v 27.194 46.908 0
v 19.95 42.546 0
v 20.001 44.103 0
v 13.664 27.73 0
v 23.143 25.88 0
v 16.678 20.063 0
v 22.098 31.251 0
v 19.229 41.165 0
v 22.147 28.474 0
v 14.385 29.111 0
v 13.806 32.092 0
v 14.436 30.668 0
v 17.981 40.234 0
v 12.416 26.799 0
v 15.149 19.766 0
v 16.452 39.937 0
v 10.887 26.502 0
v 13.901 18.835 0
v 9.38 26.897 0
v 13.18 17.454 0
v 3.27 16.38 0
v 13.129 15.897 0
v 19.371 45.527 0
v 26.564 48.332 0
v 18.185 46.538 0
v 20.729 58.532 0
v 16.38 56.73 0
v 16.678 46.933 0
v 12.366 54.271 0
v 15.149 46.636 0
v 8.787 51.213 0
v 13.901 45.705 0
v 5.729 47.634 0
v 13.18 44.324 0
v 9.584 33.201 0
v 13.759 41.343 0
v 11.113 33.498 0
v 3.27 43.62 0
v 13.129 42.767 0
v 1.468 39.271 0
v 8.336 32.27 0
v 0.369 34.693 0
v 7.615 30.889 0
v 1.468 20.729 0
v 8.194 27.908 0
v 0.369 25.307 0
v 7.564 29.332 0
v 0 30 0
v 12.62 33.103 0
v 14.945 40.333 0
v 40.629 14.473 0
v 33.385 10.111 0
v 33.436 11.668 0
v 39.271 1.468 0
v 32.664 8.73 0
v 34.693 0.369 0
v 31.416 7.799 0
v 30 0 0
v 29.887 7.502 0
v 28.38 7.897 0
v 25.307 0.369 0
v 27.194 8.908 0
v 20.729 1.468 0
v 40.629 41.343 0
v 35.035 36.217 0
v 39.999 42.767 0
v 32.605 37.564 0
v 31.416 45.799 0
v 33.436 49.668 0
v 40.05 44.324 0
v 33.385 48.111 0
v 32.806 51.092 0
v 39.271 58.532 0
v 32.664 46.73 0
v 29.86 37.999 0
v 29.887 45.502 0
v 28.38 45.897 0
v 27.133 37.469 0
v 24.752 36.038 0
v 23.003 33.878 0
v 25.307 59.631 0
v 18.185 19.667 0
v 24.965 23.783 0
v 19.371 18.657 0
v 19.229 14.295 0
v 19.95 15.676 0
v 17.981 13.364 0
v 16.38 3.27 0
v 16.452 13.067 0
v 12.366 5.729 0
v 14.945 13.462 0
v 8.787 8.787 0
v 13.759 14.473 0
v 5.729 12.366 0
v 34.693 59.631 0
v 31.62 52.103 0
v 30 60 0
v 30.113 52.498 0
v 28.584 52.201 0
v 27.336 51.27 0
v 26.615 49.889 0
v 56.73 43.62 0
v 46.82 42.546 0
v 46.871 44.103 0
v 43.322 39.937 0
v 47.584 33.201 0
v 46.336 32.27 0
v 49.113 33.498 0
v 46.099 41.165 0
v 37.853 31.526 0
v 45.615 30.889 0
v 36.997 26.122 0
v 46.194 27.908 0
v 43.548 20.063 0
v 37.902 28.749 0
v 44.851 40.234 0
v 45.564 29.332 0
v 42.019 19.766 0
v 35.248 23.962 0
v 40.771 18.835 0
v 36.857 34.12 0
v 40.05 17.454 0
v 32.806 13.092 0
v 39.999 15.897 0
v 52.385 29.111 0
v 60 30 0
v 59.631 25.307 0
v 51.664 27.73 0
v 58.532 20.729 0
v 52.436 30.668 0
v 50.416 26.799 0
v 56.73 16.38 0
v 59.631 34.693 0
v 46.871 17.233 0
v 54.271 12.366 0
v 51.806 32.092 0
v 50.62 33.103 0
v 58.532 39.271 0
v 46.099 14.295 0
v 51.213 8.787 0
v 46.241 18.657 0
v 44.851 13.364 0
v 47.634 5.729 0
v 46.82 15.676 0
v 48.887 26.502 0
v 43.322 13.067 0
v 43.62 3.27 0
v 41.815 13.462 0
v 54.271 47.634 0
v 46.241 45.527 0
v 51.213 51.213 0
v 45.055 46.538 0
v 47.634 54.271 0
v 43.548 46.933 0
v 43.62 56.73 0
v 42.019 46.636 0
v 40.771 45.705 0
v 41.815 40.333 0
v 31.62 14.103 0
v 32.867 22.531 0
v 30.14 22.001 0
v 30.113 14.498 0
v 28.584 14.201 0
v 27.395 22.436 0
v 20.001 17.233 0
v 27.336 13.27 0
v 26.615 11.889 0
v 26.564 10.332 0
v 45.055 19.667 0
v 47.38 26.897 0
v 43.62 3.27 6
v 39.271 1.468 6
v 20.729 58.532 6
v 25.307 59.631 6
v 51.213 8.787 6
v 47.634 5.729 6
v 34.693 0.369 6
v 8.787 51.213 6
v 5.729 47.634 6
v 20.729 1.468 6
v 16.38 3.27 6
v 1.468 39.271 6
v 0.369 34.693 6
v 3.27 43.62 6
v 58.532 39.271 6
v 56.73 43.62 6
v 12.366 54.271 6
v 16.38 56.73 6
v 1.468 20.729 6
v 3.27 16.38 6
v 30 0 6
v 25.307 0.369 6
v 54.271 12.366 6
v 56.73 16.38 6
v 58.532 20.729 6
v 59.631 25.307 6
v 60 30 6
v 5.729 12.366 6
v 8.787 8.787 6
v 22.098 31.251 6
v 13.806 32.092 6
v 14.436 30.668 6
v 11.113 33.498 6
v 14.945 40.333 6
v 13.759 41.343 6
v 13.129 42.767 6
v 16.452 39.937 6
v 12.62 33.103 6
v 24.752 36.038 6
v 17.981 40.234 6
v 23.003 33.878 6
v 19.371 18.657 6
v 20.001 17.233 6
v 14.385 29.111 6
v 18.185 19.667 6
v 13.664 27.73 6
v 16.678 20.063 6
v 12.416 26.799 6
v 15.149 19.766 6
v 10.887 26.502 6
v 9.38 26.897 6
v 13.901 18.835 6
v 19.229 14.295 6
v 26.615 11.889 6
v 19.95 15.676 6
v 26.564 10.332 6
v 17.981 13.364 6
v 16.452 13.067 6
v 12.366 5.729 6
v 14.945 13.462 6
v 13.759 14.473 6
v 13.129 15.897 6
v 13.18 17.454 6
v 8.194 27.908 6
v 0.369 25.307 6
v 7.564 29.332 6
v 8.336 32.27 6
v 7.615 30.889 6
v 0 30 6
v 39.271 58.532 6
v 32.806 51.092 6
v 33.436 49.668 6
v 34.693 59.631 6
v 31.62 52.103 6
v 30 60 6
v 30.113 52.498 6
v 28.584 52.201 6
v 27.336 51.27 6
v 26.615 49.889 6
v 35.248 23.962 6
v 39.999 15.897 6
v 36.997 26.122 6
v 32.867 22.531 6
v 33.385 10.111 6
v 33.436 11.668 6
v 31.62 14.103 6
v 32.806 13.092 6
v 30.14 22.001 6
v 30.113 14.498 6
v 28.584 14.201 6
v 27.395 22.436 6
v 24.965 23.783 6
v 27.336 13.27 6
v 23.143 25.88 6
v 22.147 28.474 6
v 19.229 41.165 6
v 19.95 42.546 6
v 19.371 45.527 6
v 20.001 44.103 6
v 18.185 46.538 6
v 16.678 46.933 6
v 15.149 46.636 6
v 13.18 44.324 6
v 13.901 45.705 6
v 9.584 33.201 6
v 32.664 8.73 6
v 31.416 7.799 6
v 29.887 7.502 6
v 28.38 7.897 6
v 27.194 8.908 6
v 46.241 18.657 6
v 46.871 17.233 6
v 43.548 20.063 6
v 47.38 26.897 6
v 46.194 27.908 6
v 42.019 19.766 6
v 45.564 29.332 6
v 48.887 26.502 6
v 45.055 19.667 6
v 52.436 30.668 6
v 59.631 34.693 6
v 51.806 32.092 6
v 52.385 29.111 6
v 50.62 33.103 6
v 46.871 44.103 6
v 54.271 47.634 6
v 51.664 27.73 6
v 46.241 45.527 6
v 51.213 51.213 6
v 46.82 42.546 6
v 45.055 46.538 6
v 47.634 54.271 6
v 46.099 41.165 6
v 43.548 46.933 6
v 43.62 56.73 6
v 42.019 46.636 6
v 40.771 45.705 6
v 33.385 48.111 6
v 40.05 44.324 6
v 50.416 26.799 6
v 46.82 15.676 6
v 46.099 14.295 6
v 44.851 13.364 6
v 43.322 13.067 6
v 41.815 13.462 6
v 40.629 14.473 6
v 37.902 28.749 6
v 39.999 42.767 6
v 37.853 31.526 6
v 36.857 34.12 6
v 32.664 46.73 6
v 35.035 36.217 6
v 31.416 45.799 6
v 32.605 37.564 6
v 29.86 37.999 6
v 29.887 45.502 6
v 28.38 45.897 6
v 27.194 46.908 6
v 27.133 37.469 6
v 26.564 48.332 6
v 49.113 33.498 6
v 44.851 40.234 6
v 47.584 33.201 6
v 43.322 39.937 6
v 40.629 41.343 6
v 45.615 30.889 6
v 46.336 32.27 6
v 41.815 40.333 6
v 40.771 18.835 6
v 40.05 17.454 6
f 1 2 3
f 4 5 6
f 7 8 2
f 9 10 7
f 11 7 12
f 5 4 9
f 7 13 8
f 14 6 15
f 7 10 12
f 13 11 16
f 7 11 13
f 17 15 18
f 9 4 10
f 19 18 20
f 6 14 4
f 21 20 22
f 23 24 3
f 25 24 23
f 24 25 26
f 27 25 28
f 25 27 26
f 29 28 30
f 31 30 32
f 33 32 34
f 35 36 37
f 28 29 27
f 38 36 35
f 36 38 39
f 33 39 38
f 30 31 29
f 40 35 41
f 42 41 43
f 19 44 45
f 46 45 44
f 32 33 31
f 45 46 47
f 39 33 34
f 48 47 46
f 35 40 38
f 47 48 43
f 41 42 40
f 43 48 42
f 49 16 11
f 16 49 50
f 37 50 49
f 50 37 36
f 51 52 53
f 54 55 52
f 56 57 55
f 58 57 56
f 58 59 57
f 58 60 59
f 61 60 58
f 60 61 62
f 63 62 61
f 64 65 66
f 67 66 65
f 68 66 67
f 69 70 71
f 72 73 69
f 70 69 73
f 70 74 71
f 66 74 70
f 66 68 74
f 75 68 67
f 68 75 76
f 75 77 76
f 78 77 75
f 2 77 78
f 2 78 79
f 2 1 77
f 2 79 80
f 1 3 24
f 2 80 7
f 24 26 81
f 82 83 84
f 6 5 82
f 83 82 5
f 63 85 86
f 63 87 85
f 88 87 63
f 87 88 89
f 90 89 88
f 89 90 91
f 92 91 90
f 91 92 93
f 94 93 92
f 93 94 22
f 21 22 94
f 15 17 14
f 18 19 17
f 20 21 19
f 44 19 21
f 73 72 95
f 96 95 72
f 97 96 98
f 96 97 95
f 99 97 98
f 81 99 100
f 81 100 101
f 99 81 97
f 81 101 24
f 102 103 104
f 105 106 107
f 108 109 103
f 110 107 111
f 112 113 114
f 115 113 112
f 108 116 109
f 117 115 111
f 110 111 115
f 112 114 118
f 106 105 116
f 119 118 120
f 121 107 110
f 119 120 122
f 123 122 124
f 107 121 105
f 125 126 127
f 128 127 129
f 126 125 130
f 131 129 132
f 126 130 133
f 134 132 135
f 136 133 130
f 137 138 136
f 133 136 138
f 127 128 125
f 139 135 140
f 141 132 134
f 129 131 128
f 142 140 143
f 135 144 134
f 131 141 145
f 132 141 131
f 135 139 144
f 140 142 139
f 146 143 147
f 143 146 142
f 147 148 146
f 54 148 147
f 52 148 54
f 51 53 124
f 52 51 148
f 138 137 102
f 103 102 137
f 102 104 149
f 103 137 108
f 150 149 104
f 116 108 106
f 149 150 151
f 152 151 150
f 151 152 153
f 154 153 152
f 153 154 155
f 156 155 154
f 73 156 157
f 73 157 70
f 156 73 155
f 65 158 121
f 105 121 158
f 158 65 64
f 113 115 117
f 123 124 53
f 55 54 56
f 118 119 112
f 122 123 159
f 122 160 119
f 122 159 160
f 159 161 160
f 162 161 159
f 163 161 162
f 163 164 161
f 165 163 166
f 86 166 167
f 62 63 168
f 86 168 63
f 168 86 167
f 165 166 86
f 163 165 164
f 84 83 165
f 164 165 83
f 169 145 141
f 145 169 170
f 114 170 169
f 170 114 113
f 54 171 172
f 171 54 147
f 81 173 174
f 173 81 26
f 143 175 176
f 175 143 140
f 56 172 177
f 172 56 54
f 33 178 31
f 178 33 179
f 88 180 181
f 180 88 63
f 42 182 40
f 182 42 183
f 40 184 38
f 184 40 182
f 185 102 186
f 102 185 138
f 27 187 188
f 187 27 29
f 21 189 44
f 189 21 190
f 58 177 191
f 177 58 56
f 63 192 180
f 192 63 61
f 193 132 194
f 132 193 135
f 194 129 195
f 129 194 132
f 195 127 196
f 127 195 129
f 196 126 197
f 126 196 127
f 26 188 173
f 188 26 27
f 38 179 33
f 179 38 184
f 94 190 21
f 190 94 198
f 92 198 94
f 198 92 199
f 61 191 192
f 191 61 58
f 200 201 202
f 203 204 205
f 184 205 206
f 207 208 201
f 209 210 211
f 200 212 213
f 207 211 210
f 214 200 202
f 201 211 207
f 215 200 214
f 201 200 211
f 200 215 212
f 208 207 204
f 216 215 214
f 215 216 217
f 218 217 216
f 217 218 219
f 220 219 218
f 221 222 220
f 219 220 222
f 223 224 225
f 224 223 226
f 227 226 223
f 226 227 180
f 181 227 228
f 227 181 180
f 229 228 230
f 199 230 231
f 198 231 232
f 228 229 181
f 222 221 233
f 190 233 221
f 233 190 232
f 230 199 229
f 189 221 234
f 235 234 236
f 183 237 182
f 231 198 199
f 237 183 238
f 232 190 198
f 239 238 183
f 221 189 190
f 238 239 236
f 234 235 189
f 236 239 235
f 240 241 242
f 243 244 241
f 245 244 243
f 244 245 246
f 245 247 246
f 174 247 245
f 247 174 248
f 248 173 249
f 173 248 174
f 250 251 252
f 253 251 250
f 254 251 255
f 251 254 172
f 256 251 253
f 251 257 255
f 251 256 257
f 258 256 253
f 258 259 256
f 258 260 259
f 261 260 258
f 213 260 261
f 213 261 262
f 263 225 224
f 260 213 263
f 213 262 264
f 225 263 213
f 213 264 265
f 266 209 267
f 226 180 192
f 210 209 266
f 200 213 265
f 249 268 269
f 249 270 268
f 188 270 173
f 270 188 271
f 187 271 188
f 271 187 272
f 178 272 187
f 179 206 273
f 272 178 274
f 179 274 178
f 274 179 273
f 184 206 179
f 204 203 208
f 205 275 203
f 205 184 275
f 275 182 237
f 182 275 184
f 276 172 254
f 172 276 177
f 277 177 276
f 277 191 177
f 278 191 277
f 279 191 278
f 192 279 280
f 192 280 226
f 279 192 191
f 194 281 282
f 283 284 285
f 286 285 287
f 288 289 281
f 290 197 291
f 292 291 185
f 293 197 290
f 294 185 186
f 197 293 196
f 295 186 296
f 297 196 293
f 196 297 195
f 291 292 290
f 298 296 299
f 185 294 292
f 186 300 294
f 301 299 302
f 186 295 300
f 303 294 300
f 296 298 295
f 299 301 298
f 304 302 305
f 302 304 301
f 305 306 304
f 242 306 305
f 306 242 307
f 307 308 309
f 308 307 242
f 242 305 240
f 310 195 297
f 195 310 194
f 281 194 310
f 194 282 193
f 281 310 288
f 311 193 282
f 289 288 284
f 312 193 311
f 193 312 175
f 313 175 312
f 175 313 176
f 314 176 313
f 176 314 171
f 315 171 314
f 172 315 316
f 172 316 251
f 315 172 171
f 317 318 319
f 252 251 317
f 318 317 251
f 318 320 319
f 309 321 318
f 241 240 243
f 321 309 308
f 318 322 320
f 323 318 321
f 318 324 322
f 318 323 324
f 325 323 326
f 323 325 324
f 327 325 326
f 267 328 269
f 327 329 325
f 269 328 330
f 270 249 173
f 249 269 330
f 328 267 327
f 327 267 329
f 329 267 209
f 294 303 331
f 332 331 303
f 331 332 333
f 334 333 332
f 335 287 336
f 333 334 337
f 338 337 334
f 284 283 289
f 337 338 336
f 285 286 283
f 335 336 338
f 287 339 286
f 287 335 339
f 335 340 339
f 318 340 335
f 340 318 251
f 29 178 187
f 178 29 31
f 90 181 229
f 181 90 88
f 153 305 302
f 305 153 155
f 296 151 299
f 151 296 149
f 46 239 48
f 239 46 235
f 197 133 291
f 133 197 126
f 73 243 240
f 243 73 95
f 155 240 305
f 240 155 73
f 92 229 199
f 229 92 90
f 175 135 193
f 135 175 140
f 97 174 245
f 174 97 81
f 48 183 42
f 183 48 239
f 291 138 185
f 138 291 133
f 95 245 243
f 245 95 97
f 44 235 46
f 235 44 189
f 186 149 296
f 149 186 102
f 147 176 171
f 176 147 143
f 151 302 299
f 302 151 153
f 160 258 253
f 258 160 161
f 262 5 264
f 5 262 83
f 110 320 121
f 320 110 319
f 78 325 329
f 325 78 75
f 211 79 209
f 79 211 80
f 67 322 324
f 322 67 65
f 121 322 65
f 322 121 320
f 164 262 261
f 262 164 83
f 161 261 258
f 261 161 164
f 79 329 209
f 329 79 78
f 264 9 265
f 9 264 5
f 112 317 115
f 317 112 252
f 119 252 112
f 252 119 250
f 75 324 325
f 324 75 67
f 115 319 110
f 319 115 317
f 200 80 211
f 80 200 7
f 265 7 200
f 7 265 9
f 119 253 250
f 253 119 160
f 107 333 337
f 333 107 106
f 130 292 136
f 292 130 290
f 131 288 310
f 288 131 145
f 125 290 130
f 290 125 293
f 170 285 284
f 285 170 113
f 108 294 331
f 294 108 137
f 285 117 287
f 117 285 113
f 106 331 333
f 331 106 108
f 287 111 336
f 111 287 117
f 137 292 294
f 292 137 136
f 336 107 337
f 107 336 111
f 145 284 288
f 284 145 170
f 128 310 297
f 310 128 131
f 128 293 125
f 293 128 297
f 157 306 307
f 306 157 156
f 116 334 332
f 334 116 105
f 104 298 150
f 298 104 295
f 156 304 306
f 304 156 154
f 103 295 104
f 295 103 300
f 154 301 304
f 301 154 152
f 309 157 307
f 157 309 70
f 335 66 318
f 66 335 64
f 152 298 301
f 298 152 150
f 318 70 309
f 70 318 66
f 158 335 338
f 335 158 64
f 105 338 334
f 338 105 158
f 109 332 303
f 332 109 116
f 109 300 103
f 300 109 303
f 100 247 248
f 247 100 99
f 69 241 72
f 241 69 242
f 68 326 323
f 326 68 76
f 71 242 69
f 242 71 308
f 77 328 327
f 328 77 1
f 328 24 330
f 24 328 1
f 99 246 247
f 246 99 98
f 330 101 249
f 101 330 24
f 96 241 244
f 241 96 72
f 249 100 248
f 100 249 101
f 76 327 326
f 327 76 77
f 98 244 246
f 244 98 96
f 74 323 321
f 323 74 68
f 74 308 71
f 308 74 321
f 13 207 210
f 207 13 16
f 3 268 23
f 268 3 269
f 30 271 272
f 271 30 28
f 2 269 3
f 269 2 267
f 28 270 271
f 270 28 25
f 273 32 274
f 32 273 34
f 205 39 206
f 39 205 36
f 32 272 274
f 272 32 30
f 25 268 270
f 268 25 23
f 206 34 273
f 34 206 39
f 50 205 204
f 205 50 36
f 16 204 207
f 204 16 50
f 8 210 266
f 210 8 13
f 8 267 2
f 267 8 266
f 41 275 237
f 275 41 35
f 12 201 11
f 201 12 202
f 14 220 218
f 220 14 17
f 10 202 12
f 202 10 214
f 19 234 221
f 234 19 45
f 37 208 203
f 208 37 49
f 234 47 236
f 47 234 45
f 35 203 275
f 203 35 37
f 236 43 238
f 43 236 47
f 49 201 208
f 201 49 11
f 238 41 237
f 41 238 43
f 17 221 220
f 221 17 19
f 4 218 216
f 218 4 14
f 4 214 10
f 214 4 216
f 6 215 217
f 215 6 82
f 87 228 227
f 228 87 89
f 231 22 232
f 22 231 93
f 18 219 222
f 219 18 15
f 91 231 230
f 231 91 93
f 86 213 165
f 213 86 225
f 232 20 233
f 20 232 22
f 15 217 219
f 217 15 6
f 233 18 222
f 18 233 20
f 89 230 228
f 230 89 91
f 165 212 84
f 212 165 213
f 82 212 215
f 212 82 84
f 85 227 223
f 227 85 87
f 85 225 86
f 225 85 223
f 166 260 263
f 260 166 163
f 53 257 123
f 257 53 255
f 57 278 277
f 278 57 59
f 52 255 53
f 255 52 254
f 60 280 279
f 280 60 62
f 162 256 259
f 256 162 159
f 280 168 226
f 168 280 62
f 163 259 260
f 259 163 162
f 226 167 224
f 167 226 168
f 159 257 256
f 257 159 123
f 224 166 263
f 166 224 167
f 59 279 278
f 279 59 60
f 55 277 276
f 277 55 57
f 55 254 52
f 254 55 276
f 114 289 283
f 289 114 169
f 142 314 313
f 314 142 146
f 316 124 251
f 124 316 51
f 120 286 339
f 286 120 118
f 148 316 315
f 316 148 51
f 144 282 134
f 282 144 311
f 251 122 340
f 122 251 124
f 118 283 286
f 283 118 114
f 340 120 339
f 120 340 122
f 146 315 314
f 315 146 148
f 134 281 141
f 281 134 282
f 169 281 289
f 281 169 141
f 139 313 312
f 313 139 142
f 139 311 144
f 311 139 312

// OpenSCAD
$fn = 32;

// ----------------------------------------------------------------------
// Spacer plate: round flange R30, 8 bolts
// ----------------------------------------------------------------------

// --- parameters (mm) ---
bore_r = 8;               // centre bore radius
bolt_r = 3.5;             // bolt hole radius
plate_t = 6;              // plate thickness, Z (extrusion height)
flange_r = 30;            // flange radius
n_bolt = 8;               // bolt hole count
ring_r = 19;              // bolt circle radius

profile = [[60, 30], [59.631, 34.693], [58.532, 39.271], [56.73, 43.62], [54.271, 47.634], [51.213, 51.213], [47.634, 54.271], [43.62, 56.73], [39.271, 58.532], [34.693, 59.631], [30, 60], [25.307, 59.631], [20.729, 58.532], [16.38, 56.73], [12.366, 54.271], [8.787, 51.213], [5.729, 47.634], [3.27, 43.62], [1.468, 39.271], [0.369, 34.693], [0, 30], [0.369, 25.307], [1.468, 20.729], [3.27, 16.38], [5.729, 12.366], [8.787, 8.787], [12.366, 5.729], [16.38, 3.27], [20.729, 1.468], [25.307, 0.369], [30, 0], [34.693, 0.369], [39.271, 1.468], [43.62, 3.27], [47.634, 5.729], [51.213, 8.787], [54.271, 12.366], [56.73, 16.38], [58.532, 20.729], [59.631, 25.307]];  // primary outline, 40 points, counter clockwise
void_1 = [[37.853, 31.526], [36.857, 34.12], [35.035, 36.217], [32.605, 37.564], [29.86, 37.999], [27.133, 37.469], [24.752, 36.038], [23.003, 33.878], [22.098, 31.251], [22.147, 28.474], [23.143, 25.88], [24.965, 23.783], [27.395, 22.436], [30.14, 22.001], [32.867, 22.531], [35.248, 23.962], [36.997, 26.122], [37.902, 28.749]];  // centre bore, 18 points
void_2 = [[52.436, 30.668], [51.806, 32.092], [50.62, 33.103], [49.113, 33.498], [47.584, 33.201], [46.336, 32.27], [45.615, 30.889], [45.564, 29.332], [46.194, 27.908], [47.38, 26.897], [48.887, 26.502], [50.416, 26.799], [51.664, 27.73], [52.385, 29.111]];  // bolt hole 1, 14 points
void_3 = [[46.871, 44.103], [46.241, 45.527], [45.055, 46.538], [43.548, 46.933], [42.019, 46.636], [40.771, 45.705], [40.05, 44.324], [39.999, 42.767], [40.629, 41.343], [41.815, 40.333], [43.322, 39.937], [44.851, 40.234], [46.099, 41.165], [46.82, 42.546]];  // bolt hole 2, 14 points
void_4 = [[33.436, 49.668], [32.806, 51.092], [31.62, 52.103], [30.113, 52.498], [28.584, 52.201], [27.336, 51.27], [26.615, 49.889], [26.564, 48.332], [27.194, 46.908], [28.38, 45.897], [29.887, 45.502], [31.416, 45.799], [32.664, 46.73], [33.385, 48.111]];  // bolt hole 3, 14 points
void_5 = [[20.001, 44.103], [19.371, 45.527], [18.185, 46.538], [16.678, 46.933], [15.149, 46.636], [13.901, 45.705], [13.18, 44.324], [13.129, 42.767], [13.759, 41.343], [14.945, 40.333], [16.452, 39.937], [17.981, 40.234], [19.229, 41.165], [19.95, 42.546]];  // bolt hole 4, 14 points
void_6 = [[14.436, 30.668], [13.806, 32.092], [12.62, 33.103], [11.113, 33.498], [9.584, 33.201], [8.336, 32.27], [7.615, 30.889], [7.564, 29.332], [8.194, 27.908], [9.38, 26.897], [10.887, 26.502], [12.416, 26.799], [13.664, 27.73], [14.385, 29.111]];  // bolt hole 5, 14 points
void_7 = [[20.001, 17.233], [19.371, 18.657], [18.185, 19.667], [16.678, 20.063], [15.149, 19.766], [13.901, 18.835], [13.18, 17.454], [13.129, 15.897], [13.759, 14.473], [14.945, 13.462], [16.452, 13.067], [17.981, 13.364], [19.229, 14.295], [19.95, 15.676]];  // bolt hole 6, 14 points
void_8 = [[33.436, 11.668], [32.806, 13.092], [31.62, 14.103], [30.113, 14.498], [28.584, 14.201], [27.336, 13.27], [26.615, 11.889], [26.564, 10.332], [27.194, 8.908], [28.38, 7.897], [29.887, 7.502], [31.416, 7.799], [32.664, 8.73], [33.385, 10.111]];  // bolt hole 7, 14 points
void_9 = [[46.871, 17.233], [46.241, 18.657], [45.055, 19.667], [43.548, 20.063], [42.019, 19.766], [40.771, 18.835], [40.05, 17.454], [39.999, 15.897], [40.629, 14.473], [41.815, 13.462], [43.322, 13.067], [44.851, 13.364], [46.099, 14.295], [46.82, 15.676]];  // bolt hole 8, 14 points

// --- the one profile operation ---
difference() {
  linear_extrude(height = plate_t) polygon(points = profile);
  translate([0, 0, -1])
    linear_extrude(height = plate_t + 2) polygon(points = void_1);
  translate([0, 0, -1])
    linear_extrude(height = plate_t + 2) polygon(points = void_2);
  translate([0, 0, -1])
    linear_extrude(height = plate_t + 2) polygon(points = void_3);
  translate([0, 0, -1])
    linear_extrude(height = plate_t + 2) polygon(points = void_4);
  translate([0, 0, -1])
    linear_extrude(height = plate_t + 2) polygon(points = void_5);
  translate([0, 0, -1])
    linear_extrude(height = plate_t + 2) polygon(points = void_6);
  translate([0, 0, -1])
    linear_extrude(height = plate_t + 2) polygon(points = void_7);
  translate([0, 0, -1])
    linear_extrude(height = plate_t + 2) polygon(points = void_8);
  translate([0, 0, -1])
    linear_extrude(height = plate_t + 2) polygon(points = void_9);
}
